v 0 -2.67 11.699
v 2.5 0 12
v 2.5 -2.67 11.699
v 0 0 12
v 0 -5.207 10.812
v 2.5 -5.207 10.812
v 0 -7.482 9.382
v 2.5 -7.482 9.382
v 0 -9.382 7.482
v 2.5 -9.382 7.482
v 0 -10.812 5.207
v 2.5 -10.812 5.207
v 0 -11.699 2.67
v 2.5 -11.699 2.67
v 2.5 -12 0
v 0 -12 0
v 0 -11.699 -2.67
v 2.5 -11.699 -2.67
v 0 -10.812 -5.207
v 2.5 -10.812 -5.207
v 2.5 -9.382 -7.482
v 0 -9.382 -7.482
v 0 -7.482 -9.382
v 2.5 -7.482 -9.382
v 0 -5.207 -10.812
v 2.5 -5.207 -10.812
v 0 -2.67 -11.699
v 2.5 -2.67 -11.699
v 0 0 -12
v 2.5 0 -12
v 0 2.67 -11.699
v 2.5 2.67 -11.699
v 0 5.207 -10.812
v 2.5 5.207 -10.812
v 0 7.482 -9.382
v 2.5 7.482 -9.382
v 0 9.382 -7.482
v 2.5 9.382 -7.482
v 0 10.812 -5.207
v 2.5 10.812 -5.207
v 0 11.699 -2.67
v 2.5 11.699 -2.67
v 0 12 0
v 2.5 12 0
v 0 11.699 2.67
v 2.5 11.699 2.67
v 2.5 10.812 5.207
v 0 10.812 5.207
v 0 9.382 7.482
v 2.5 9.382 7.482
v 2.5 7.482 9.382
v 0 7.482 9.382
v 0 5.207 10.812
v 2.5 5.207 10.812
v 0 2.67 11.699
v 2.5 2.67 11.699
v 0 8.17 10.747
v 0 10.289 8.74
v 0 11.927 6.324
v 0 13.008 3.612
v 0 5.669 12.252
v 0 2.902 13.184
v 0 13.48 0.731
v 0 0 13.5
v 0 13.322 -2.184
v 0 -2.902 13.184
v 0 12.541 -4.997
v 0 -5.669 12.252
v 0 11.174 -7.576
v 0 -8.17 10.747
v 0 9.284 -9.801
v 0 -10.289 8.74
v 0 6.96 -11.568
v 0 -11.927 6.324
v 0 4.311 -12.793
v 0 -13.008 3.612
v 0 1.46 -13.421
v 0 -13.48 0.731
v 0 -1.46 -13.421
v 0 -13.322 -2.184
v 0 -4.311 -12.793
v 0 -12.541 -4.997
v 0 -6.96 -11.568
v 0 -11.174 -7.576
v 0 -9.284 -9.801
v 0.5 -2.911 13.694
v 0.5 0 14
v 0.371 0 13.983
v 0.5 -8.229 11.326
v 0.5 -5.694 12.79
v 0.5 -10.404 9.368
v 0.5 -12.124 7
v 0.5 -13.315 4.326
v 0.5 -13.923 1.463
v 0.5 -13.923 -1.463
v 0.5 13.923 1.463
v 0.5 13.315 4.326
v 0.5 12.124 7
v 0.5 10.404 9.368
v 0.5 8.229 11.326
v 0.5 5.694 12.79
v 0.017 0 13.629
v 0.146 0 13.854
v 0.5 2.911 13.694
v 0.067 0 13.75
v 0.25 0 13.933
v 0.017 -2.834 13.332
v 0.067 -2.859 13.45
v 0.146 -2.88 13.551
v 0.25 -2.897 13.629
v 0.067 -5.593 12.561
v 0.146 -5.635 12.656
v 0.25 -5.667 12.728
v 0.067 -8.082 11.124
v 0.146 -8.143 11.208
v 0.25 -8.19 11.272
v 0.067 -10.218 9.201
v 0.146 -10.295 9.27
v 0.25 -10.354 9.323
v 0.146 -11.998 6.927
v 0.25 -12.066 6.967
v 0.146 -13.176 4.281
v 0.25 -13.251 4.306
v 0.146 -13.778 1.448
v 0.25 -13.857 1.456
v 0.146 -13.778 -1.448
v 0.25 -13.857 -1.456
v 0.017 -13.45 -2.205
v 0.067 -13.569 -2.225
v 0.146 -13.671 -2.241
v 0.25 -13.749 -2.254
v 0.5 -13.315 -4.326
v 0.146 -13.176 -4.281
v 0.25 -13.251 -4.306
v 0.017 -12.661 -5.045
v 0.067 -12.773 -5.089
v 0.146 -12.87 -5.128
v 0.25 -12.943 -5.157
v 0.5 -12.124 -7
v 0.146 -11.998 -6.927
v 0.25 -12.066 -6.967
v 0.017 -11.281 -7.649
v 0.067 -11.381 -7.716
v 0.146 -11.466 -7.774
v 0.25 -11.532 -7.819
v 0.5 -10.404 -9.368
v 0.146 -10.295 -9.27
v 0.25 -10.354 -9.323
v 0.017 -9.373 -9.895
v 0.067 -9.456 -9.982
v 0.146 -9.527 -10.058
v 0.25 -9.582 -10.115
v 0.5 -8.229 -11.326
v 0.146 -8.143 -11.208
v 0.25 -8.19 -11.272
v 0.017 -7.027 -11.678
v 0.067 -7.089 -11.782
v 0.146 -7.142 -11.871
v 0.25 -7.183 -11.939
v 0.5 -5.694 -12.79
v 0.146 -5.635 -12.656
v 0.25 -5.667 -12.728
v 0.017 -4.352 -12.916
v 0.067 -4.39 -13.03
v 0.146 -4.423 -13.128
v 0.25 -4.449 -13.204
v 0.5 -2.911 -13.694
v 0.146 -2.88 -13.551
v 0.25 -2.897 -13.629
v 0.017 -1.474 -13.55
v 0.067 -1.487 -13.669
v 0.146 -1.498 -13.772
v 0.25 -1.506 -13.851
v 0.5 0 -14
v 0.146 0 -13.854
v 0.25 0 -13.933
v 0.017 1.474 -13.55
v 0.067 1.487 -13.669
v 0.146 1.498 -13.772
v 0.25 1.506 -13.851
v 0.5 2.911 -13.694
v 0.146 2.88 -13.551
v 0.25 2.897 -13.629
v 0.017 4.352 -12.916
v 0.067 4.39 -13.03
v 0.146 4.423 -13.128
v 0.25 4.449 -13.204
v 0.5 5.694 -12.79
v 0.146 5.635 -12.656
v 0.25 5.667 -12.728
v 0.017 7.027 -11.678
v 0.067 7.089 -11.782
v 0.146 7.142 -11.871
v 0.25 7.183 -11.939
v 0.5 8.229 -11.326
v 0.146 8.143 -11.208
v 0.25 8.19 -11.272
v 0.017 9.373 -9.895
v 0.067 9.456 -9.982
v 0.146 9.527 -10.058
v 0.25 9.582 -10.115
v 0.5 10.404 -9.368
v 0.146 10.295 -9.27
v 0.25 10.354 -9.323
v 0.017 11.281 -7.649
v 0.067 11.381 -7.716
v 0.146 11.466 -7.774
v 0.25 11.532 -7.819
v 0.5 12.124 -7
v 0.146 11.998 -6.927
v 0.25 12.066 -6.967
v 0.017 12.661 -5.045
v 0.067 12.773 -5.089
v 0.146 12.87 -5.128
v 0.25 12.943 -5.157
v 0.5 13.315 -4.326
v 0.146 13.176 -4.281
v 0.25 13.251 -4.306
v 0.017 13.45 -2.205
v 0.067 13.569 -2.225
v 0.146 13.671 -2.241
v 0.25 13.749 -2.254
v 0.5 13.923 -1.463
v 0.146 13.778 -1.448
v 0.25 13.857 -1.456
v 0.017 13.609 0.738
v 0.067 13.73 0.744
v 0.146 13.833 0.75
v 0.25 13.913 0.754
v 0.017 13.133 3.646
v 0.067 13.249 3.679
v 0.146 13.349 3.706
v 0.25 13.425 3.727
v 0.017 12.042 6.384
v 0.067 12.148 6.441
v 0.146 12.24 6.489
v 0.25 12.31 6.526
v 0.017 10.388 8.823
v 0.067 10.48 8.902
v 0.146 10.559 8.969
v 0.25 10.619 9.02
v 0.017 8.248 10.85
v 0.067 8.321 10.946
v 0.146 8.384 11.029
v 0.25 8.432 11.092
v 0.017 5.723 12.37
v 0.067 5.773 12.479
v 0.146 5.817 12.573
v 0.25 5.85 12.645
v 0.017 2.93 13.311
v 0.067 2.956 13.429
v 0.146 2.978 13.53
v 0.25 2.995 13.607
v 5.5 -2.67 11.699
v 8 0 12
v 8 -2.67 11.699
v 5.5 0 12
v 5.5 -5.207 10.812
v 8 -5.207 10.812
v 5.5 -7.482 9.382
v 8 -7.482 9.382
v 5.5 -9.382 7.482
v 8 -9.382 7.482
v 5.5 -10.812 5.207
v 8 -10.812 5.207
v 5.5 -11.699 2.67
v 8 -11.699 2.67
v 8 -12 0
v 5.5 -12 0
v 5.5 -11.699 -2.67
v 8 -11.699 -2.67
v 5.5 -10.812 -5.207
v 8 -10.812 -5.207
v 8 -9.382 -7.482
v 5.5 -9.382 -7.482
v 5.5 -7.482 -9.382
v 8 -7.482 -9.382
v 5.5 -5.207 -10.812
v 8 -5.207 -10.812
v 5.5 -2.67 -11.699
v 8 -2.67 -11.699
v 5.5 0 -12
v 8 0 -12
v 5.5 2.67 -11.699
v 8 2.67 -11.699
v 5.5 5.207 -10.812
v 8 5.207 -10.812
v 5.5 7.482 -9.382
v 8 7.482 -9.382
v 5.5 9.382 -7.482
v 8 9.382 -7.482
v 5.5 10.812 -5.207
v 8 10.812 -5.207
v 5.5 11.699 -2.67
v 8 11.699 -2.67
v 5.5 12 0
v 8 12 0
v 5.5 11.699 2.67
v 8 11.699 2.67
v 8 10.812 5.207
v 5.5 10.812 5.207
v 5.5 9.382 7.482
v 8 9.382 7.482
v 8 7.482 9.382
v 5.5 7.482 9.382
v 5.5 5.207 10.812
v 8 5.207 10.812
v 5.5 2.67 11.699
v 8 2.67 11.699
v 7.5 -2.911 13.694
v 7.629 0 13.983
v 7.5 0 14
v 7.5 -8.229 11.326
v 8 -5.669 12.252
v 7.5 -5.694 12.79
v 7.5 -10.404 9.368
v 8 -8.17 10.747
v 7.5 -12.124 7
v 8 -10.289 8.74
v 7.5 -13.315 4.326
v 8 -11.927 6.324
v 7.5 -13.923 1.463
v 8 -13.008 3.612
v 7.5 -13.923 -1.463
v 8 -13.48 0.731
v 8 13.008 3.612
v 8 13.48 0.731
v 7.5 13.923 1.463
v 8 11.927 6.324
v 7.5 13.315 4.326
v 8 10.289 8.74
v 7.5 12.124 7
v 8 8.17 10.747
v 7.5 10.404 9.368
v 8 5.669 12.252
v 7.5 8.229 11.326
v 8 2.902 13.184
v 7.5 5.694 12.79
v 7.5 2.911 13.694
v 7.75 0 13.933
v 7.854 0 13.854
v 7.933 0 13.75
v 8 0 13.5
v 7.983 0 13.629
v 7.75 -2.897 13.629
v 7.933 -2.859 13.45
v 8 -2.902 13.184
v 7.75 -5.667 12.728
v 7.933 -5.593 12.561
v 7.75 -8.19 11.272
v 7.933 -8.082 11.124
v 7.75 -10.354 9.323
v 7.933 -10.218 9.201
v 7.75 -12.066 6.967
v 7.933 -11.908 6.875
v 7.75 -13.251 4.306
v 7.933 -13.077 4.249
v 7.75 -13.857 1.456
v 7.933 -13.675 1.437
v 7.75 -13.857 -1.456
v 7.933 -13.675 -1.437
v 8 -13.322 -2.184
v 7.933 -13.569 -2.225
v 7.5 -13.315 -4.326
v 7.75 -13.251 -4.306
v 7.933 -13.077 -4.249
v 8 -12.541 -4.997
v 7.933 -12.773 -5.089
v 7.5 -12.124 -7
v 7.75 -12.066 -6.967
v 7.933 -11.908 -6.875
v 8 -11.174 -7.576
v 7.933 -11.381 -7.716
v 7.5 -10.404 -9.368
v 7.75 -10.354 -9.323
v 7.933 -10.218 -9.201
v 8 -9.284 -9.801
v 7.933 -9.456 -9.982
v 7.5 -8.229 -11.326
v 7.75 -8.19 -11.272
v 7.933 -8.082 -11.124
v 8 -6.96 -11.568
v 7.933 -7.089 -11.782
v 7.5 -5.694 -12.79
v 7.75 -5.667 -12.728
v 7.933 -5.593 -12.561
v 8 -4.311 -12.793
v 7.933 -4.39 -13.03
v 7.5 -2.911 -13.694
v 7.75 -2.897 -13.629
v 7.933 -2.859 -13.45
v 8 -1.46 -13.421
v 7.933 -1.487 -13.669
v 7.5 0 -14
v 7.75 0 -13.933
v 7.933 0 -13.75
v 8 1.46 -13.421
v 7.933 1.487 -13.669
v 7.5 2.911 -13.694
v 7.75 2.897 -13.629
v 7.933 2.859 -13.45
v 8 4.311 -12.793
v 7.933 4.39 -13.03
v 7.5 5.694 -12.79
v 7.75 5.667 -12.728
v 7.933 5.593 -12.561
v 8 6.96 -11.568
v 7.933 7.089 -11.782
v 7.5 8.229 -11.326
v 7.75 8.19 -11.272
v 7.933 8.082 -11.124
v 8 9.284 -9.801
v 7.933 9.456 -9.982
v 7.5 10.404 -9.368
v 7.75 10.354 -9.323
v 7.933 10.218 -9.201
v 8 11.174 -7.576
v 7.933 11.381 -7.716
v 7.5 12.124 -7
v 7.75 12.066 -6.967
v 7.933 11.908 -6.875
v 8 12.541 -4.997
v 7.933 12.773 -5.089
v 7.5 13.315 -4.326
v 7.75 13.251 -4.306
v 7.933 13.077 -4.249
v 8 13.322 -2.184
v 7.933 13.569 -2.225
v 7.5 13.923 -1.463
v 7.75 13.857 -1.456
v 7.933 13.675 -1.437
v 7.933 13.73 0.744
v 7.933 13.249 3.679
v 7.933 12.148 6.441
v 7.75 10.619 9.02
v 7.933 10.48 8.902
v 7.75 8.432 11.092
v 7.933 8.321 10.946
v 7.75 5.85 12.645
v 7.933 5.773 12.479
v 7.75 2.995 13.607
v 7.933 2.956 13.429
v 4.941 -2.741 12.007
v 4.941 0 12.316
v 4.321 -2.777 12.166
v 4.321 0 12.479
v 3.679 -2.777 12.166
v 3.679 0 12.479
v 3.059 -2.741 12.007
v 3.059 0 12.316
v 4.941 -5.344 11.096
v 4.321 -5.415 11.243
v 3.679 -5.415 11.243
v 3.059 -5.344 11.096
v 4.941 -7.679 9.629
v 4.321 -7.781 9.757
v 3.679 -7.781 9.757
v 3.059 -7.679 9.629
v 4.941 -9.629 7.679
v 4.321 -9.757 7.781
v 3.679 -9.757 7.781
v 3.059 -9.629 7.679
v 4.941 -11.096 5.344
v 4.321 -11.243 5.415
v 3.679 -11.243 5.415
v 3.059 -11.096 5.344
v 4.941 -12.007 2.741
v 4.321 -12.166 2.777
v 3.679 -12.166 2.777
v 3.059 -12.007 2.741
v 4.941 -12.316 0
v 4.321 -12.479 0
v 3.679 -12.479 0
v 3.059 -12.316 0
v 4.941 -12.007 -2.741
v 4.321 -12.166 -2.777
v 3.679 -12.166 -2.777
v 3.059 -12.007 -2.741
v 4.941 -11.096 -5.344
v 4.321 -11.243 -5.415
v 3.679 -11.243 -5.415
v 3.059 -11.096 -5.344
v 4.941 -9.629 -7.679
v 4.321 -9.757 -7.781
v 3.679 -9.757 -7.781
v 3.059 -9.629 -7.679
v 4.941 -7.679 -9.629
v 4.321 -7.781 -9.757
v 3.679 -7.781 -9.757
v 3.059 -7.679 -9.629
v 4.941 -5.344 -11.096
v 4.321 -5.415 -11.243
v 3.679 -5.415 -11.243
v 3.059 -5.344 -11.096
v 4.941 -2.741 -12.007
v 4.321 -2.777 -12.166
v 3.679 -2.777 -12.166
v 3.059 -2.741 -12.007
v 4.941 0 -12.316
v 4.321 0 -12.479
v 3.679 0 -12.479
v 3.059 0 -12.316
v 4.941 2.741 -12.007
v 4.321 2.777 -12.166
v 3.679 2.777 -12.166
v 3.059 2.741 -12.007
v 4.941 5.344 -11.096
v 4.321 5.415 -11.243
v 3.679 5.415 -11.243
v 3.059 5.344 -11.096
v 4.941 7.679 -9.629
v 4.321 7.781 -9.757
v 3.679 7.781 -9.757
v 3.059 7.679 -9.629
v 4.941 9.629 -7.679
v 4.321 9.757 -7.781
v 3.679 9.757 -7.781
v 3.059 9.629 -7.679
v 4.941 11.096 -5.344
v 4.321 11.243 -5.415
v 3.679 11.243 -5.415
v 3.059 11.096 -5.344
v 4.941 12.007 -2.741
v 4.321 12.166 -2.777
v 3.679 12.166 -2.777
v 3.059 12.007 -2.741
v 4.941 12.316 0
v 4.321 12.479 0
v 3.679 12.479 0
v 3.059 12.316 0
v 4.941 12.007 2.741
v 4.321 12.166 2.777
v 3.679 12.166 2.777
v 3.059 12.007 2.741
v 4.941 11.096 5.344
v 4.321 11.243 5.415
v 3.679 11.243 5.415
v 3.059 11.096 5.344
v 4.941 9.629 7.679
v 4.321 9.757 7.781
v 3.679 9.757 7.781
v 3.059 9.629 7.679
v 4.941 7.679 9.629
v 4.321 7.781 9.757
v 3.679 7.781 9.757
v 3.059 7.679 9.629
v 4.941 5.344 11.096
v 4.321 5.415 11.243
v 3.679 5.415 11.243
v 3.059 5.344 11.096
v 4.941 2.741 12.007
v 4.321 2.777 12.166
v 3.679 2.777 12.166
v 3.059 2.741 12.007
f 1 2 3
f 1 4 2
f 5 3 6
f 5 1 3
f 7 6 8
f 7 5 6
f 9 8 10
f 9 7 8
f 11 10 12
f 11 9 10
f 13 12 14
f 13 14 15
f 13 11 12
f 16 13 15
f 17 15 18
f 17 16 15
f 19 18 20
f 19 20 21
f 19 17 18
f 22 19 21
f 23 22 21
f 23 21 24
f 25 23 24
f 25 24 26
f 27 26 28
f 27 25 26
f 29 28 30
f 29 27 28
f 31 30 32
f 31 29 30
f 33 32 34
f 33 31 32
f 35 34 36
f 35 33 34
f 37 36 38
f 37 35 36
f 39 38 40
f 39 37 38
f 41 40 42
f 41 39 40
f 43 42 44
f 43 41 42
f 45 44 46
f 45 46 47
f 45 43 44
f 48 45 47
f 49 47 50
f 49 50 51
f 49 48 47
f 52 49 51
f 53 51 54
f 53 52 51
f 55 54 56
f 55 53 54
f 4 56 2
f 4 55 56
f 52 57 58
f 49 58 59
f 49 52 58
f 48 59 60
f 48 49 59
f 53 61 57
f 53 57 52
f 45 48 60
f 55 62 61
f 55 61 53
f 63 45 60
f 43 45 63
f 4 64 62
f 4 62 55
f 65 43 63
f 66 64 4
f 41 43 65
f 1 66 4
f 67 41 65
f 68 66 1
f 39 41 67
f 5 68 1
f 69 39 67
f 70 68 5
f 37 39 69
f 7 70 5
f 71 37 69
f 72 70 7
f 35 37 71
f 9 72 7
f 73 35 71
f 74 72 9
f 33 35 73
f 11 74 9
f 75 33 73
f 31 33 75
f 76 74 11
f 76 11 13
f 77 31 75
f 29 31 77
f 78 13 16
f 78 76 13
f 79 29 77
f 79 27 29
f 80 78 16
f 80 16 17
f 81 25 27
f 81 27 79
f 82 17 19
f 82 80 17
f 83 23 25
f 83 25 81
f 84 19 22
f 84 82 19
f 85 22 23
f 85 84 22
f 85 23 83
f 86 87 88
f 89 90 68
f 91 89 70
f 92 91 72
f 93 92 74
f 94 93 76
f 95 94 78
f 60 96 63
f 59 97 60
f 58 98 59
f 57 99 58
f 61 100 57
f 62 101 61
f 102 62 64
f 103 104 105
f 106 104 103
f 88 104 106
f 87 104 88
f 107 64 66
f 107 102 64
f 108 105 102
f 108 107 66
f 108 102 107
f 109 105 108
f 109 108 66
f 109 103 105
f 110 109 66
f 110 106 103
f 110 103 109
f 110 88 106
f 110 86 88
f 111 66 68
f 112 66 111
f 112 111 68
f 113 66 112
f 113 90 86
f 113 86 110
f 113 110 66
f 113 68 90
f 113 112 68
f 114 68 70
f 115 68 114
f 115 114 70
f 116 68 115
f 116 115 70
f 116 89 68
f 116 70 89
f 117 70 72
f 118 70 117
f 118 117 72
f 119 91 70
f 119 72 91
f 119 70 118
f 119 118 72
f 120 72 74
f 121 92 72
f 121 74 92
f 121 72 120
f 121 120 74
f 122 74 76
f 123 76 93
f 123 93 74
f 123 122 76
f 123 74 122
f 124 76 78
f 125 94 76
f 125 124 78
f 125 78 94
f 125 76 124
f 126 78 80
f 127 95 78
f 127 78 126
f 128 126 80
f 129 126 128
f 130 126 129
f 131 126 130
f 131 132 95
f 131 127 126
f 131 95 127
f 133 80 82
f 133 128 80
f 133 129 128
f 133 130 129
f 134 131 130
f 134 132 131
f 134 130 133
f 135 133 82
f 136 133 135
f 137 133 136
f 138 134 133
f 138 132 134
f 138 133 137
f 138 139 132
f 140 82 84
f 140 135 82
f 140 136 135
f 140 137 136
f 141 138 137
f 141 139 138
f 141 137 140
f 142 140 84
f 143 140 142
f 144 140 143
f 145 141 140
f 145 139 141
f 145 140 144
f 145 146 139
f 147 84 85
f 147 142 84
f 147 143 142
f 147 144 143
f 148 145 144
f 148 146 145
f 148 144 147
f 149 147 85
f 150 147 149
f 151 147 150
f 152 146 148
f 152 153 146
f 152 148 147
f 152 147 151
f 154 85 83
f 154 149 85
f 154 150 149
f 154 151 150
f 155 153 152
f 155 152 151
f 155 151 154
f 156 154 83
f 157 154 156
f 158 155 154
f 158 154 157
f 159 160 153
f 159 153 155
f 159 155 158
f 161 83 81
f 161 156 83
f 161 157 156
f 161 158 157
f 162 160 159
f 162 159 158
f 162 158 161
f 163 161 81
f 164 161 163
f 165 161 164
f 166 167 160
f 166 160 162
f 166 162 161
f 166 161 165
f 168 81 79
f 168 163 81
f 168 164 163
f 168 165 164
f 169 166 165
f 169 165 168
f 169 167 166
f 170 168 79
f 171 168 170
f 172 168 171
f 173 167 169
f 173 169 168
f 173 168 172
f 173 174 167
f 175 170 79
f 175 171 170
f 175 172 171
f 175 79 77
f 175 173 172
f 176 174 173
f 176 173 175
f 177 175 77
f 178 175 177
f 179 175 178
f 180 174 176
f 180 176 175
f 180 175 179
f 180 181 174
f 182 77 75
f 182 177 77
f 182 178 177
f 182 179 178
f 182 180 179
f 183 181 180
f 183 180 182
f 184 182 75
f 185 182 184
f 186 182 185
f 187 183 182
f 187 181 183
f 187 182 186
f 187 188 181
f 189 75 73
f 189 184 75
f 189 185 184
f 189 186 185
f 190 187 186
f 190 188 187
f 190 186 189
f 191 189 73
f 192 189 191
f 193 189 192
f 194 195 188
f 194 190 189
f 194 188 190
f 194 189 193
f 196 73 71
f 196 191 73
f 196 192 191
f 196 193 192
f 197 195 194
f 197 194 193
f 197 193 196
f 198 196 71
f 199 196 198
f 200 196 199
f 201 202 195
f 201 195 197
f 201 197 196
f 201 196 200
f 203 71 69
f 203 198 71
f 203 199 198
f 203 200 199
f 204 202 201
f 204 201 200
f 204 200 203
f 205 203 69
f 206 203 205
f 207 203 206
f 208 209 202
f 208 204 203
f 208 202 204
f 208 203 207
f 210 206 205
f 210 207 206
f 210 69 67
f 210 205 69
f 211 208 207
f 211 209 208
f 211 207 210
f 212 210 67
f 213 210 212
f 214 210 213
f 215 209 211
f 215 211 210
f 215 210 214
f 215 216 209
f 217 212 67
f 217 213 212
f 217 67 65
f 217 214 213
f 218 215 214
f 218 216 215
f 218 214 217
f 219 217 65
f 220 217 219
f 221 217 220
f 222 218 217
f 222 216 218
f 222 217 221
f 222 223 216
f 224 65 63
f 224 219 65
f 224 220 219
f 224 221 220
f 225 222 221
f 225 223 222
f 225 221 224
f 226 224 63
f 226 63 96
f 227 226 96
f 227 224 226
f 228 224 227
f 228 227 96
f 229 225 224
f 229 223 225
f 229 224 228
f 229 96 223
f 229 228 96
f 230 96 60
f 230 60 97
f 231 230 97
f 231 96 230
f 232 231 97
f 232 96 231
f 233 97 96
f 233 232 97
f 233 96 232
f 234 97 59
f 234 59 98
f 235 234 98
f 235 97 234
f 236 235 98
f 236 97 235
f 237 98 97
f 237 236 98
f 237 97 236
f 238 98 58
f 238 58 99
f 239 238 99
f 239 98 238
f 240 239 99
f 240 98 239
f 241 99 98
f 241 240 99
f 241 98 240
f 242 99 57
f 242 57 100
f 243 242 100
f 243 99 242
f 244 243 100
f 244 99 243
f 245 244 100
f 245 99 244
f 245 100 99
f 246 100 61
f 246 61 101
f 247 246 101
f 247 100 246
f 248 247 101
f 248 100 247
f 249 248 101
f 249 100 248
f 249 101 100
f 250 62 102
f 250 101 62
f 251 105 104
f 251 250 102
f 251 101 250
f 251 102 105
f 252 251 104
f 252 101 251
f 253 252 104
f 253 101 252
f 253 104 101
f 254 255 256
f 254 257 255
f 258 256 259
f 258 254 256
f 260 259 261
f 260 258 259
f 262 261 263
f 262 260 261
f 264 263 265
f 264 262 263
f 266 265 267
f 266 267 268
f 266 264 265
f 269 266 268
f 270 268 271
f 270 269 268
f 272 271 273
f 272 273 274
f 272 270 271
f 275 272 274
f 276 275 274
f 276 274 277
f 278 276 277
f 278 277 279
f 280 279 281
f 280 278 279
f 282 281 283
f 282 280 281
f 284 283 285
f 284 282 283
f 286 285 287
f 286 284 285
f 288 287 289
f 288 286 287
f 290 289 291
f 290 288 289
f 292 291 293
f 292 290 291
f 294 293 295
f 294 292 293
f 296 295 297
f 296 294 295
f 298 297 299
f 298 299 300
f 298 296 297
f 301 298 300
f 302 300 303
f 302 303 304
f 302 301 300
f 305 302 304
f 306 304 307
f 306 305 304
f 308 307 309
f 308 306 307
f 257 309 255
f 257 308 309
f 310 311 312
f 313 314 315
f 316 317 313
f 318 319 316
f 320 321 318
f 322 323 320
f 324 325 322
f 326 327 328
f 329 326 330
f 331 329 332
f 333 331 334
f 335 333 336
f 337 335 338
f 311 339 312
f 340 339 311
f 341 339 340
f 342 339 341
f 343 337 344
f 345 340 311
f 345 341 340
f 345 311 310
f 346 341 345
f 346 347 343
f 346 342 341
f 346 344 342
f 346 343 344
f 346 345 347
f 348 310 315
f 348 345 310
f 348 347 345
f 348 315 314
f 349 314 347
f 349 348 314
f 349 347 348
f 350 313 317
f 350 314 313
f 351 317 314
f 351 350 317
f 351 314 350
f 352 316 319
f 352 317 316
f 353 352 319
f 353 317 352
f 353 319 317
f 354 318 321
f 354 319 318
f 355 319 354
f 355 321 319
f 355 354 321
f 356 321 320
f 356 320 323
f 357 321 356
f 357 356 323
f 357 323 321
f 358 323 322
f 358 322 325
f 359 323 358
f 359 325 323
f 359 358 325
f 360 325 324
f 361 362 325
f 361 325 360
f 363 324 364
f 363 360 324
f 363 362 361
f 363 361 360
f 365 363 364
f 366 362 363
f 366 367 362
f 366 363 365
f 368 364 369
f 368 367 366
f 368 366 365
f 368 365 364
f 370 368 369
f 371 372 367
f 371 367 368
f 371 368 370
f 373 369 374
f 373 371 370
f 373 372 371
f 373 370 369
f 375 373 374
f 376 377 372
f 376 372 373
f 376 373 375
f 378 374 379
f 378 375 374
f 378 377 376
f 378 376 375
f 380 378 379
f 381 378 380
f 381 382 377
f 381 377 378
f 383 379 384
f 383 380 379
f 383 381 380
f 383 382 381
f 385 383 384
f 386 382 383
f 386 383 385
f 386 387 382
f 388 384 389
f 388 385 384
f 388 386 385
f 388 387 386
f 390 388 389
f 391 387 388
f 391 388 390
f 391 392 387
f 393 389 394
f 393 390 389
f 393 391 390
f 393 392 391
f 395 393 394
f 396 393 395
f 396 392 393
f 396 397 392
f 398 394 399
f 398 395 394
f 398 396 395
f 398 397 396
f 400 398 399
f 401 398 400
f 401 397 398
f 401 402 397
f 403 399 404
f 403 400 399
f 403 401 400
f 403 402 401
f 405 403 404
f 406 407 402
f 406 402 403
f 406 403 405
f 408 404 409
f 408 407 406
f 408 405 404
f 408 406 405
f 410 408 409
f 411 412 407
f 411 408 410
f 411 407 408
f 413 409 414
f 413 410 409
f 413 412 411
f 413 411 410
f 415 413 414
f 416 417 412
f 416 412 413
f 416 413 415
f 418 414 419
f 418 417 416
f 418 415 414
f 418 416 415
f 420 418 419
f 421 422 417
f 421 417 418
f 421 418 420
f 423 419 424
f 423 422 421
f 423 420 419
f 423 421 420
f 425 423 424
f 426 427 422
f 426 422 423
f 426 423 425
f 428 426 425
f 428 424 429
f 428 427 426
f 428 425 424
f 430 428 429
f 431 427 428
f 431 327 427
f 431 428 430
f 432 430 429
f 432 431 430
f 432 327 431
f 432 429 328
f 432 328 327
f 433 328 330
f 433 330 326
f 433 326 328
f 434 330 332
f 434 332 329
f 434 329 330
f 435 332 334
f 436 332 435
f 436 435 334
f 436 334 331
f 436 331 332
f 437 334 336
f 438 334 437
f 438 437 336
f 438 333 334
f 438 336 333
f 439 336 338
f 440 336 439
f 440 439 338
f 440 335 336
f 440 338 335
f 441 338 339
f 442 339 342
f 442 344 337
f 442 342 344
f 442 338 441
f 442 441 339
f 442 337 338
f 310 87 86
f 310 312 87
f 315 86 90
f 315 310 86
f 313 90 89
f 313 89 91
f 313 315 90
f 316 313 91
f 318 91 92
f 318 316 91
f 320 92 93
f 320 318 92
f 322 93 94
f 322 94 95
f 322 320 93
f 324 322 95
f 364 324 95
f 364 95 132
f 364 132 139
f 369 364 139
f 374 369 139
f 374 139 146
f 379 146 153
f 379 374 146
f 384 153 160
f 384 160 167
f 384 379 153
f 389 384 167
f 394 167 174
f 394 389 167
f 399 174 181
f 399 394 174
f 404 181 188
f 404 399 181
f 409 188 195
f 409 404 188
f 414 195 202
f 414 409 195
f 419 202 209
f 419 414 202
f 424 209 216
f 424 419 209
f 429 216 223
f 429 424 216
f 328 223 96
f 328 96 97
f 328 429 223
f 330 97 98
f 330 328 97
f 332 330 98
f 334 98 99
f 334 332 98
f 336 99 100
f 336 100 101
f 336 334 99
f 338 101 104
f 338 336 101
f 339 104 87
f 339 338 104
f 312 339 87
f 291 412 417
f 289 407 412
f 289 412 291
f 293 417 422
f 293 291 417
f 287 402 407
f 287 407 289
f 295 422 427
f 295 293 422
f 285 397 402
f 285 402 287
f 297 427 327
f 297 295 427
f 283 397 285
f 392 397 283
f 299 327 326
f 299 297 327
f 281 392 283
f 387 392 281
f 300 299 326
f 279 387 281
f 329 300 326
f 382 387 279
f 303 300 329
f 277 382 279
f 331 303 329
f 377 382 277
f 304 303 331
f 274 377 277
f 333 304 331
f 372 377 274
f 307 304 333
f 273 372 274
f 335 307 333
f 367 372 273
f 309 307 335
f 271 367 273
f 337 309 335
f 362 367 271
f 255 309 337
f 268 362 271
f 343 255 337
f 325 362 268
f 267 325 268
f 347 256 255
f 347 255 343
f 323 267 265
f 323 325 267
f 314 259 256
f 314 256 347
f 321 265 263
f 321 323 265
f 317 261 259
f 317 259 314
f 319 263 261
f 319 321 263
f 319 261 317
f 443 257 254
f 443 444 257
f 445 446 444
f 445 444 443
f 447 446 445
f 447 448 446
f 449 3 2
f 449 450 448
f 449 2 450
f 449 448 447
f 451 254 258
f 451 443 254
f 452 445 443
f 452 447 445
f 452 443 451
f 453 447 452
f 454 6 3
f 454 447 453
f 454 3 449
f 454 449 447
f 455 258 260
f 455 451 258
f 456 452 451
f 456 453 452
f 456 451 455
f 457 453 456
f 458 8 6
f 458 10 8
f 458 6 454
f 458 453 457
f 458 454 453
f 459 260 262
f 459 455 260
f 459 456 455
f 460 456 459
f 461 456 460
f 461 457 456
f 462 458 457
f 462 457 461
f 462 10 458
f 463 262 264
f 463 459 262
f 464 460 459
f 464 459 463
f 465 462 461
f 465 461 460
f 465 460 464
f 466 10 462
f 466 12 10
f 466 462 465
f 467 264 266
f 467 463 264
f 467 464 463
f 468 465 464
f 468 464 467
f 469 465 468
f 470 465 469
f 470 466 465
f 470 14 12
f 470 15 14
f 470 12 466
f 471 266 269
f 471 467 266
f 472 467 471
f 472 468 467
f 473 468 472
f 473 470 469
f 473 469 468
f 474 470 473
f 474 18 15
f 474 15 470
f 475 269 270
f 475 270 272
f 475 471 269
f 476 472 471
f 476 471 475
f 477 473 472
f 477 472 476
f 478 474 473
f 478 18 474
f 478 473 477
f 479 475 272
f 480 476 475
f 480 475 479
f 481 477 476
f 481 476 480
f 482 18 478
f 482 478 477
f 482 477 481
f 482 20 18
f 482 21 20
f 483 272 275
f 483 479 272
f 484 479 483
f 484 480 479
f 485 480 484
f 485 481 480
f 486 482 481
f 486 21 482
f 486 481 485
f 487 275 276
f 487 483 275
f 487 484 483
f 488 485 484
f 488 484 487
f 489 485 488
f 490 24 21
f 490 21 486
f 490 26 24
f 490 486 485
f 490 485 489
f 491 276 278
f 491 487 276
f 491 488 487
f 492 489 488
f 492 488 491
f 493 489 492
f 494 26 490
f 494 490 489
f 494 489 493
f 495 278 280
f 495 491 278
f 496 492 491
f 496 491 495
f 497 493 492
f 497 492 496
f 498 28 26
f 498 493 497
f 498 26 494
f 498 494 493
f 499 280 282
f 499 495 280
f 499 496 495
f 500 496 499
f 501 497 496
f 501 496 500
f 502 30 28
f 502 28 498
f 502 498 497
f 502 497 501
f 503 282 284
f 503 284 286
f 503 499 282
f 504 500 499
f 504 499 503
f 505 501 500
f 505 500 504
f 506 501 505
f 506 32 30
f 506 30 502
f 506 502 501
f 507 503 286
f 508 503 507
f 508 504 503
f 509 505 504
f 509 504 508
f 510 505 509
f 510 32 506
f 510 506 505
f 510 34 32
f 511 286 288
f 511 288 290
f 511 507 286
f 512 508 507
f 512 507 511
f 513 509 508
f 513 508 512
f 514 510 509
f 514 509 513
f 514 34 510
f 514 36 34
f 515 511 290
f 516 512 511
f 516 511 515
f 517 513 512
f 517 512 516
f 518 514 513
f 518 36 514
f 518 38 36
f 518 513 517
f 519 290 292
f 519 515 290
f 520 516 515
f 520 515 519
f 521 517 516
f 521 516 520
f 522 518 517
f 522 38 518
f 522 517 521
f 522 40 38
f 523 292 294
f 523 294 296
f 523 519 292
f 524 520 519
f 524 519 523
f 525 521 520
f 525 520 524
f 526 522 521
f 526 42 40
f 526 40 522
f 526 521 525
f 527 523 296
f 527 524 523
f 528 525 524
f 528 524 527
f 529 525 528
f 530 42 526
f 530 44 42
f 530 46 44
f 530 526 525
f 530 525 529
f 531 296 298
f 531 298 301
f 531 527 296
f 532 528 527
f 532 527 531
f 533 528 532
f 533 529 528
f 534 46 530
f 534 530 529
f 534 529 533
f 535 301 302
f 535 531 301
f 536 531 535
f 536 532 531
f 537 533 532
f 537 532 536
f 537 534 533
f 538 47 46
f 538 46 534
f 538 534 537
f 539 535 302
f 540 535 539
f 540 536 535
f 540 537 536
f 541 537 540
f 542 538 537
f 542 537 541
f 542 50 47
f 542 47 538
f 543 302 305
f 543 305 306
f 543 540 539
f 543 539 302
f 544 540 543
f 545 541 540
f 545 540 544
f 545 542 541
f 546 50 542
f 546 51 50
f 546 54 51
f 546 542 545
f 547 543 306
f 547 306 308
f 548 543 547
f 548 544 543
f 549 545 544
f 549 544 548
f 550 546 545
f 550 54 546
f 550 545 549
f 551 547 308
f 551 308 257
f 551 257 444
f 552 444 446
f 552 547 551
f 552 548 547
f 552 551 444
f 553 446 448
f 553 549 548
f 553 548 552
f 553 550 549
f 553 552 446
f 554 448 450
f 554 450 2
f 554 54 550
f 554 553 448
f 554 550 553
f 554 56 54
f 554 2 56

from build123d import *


with BuildPart() as part:
    # Esquisse1 → Bague exterieure (revolve)
    with BuildSketch(Plane.XY, mode=Mode.PRIVATE) as bague_exterieure_sk:
        with BuildLine():
            Line((0, 12), (0, 13.5))
            ThreePointArc((0, 13.5), (0.146446609, 13.853553391), (0.5, 14))
            Line((0.5, 14), (7.5, 14))
            ThreePointArc((7.5, 14), (7.853553391, 13.853553391), (8, 13.5))
            Line((8, 13.5), (8, 12))
            Line((8, 12), (5.5, 12))
            ThreePointArc((5.5, 12), (4, 12.5), (2.5, 12))
            Line((2.5, 12), (0, 12))
        make_face()
    revolve(bague_exterieure_sk.sketch.rotate(Axis((0, 0, 0), (1, 0, 0)), 90), axis=Axis((0, 0, 0), (1, 0, 0)))


solid = part.part
